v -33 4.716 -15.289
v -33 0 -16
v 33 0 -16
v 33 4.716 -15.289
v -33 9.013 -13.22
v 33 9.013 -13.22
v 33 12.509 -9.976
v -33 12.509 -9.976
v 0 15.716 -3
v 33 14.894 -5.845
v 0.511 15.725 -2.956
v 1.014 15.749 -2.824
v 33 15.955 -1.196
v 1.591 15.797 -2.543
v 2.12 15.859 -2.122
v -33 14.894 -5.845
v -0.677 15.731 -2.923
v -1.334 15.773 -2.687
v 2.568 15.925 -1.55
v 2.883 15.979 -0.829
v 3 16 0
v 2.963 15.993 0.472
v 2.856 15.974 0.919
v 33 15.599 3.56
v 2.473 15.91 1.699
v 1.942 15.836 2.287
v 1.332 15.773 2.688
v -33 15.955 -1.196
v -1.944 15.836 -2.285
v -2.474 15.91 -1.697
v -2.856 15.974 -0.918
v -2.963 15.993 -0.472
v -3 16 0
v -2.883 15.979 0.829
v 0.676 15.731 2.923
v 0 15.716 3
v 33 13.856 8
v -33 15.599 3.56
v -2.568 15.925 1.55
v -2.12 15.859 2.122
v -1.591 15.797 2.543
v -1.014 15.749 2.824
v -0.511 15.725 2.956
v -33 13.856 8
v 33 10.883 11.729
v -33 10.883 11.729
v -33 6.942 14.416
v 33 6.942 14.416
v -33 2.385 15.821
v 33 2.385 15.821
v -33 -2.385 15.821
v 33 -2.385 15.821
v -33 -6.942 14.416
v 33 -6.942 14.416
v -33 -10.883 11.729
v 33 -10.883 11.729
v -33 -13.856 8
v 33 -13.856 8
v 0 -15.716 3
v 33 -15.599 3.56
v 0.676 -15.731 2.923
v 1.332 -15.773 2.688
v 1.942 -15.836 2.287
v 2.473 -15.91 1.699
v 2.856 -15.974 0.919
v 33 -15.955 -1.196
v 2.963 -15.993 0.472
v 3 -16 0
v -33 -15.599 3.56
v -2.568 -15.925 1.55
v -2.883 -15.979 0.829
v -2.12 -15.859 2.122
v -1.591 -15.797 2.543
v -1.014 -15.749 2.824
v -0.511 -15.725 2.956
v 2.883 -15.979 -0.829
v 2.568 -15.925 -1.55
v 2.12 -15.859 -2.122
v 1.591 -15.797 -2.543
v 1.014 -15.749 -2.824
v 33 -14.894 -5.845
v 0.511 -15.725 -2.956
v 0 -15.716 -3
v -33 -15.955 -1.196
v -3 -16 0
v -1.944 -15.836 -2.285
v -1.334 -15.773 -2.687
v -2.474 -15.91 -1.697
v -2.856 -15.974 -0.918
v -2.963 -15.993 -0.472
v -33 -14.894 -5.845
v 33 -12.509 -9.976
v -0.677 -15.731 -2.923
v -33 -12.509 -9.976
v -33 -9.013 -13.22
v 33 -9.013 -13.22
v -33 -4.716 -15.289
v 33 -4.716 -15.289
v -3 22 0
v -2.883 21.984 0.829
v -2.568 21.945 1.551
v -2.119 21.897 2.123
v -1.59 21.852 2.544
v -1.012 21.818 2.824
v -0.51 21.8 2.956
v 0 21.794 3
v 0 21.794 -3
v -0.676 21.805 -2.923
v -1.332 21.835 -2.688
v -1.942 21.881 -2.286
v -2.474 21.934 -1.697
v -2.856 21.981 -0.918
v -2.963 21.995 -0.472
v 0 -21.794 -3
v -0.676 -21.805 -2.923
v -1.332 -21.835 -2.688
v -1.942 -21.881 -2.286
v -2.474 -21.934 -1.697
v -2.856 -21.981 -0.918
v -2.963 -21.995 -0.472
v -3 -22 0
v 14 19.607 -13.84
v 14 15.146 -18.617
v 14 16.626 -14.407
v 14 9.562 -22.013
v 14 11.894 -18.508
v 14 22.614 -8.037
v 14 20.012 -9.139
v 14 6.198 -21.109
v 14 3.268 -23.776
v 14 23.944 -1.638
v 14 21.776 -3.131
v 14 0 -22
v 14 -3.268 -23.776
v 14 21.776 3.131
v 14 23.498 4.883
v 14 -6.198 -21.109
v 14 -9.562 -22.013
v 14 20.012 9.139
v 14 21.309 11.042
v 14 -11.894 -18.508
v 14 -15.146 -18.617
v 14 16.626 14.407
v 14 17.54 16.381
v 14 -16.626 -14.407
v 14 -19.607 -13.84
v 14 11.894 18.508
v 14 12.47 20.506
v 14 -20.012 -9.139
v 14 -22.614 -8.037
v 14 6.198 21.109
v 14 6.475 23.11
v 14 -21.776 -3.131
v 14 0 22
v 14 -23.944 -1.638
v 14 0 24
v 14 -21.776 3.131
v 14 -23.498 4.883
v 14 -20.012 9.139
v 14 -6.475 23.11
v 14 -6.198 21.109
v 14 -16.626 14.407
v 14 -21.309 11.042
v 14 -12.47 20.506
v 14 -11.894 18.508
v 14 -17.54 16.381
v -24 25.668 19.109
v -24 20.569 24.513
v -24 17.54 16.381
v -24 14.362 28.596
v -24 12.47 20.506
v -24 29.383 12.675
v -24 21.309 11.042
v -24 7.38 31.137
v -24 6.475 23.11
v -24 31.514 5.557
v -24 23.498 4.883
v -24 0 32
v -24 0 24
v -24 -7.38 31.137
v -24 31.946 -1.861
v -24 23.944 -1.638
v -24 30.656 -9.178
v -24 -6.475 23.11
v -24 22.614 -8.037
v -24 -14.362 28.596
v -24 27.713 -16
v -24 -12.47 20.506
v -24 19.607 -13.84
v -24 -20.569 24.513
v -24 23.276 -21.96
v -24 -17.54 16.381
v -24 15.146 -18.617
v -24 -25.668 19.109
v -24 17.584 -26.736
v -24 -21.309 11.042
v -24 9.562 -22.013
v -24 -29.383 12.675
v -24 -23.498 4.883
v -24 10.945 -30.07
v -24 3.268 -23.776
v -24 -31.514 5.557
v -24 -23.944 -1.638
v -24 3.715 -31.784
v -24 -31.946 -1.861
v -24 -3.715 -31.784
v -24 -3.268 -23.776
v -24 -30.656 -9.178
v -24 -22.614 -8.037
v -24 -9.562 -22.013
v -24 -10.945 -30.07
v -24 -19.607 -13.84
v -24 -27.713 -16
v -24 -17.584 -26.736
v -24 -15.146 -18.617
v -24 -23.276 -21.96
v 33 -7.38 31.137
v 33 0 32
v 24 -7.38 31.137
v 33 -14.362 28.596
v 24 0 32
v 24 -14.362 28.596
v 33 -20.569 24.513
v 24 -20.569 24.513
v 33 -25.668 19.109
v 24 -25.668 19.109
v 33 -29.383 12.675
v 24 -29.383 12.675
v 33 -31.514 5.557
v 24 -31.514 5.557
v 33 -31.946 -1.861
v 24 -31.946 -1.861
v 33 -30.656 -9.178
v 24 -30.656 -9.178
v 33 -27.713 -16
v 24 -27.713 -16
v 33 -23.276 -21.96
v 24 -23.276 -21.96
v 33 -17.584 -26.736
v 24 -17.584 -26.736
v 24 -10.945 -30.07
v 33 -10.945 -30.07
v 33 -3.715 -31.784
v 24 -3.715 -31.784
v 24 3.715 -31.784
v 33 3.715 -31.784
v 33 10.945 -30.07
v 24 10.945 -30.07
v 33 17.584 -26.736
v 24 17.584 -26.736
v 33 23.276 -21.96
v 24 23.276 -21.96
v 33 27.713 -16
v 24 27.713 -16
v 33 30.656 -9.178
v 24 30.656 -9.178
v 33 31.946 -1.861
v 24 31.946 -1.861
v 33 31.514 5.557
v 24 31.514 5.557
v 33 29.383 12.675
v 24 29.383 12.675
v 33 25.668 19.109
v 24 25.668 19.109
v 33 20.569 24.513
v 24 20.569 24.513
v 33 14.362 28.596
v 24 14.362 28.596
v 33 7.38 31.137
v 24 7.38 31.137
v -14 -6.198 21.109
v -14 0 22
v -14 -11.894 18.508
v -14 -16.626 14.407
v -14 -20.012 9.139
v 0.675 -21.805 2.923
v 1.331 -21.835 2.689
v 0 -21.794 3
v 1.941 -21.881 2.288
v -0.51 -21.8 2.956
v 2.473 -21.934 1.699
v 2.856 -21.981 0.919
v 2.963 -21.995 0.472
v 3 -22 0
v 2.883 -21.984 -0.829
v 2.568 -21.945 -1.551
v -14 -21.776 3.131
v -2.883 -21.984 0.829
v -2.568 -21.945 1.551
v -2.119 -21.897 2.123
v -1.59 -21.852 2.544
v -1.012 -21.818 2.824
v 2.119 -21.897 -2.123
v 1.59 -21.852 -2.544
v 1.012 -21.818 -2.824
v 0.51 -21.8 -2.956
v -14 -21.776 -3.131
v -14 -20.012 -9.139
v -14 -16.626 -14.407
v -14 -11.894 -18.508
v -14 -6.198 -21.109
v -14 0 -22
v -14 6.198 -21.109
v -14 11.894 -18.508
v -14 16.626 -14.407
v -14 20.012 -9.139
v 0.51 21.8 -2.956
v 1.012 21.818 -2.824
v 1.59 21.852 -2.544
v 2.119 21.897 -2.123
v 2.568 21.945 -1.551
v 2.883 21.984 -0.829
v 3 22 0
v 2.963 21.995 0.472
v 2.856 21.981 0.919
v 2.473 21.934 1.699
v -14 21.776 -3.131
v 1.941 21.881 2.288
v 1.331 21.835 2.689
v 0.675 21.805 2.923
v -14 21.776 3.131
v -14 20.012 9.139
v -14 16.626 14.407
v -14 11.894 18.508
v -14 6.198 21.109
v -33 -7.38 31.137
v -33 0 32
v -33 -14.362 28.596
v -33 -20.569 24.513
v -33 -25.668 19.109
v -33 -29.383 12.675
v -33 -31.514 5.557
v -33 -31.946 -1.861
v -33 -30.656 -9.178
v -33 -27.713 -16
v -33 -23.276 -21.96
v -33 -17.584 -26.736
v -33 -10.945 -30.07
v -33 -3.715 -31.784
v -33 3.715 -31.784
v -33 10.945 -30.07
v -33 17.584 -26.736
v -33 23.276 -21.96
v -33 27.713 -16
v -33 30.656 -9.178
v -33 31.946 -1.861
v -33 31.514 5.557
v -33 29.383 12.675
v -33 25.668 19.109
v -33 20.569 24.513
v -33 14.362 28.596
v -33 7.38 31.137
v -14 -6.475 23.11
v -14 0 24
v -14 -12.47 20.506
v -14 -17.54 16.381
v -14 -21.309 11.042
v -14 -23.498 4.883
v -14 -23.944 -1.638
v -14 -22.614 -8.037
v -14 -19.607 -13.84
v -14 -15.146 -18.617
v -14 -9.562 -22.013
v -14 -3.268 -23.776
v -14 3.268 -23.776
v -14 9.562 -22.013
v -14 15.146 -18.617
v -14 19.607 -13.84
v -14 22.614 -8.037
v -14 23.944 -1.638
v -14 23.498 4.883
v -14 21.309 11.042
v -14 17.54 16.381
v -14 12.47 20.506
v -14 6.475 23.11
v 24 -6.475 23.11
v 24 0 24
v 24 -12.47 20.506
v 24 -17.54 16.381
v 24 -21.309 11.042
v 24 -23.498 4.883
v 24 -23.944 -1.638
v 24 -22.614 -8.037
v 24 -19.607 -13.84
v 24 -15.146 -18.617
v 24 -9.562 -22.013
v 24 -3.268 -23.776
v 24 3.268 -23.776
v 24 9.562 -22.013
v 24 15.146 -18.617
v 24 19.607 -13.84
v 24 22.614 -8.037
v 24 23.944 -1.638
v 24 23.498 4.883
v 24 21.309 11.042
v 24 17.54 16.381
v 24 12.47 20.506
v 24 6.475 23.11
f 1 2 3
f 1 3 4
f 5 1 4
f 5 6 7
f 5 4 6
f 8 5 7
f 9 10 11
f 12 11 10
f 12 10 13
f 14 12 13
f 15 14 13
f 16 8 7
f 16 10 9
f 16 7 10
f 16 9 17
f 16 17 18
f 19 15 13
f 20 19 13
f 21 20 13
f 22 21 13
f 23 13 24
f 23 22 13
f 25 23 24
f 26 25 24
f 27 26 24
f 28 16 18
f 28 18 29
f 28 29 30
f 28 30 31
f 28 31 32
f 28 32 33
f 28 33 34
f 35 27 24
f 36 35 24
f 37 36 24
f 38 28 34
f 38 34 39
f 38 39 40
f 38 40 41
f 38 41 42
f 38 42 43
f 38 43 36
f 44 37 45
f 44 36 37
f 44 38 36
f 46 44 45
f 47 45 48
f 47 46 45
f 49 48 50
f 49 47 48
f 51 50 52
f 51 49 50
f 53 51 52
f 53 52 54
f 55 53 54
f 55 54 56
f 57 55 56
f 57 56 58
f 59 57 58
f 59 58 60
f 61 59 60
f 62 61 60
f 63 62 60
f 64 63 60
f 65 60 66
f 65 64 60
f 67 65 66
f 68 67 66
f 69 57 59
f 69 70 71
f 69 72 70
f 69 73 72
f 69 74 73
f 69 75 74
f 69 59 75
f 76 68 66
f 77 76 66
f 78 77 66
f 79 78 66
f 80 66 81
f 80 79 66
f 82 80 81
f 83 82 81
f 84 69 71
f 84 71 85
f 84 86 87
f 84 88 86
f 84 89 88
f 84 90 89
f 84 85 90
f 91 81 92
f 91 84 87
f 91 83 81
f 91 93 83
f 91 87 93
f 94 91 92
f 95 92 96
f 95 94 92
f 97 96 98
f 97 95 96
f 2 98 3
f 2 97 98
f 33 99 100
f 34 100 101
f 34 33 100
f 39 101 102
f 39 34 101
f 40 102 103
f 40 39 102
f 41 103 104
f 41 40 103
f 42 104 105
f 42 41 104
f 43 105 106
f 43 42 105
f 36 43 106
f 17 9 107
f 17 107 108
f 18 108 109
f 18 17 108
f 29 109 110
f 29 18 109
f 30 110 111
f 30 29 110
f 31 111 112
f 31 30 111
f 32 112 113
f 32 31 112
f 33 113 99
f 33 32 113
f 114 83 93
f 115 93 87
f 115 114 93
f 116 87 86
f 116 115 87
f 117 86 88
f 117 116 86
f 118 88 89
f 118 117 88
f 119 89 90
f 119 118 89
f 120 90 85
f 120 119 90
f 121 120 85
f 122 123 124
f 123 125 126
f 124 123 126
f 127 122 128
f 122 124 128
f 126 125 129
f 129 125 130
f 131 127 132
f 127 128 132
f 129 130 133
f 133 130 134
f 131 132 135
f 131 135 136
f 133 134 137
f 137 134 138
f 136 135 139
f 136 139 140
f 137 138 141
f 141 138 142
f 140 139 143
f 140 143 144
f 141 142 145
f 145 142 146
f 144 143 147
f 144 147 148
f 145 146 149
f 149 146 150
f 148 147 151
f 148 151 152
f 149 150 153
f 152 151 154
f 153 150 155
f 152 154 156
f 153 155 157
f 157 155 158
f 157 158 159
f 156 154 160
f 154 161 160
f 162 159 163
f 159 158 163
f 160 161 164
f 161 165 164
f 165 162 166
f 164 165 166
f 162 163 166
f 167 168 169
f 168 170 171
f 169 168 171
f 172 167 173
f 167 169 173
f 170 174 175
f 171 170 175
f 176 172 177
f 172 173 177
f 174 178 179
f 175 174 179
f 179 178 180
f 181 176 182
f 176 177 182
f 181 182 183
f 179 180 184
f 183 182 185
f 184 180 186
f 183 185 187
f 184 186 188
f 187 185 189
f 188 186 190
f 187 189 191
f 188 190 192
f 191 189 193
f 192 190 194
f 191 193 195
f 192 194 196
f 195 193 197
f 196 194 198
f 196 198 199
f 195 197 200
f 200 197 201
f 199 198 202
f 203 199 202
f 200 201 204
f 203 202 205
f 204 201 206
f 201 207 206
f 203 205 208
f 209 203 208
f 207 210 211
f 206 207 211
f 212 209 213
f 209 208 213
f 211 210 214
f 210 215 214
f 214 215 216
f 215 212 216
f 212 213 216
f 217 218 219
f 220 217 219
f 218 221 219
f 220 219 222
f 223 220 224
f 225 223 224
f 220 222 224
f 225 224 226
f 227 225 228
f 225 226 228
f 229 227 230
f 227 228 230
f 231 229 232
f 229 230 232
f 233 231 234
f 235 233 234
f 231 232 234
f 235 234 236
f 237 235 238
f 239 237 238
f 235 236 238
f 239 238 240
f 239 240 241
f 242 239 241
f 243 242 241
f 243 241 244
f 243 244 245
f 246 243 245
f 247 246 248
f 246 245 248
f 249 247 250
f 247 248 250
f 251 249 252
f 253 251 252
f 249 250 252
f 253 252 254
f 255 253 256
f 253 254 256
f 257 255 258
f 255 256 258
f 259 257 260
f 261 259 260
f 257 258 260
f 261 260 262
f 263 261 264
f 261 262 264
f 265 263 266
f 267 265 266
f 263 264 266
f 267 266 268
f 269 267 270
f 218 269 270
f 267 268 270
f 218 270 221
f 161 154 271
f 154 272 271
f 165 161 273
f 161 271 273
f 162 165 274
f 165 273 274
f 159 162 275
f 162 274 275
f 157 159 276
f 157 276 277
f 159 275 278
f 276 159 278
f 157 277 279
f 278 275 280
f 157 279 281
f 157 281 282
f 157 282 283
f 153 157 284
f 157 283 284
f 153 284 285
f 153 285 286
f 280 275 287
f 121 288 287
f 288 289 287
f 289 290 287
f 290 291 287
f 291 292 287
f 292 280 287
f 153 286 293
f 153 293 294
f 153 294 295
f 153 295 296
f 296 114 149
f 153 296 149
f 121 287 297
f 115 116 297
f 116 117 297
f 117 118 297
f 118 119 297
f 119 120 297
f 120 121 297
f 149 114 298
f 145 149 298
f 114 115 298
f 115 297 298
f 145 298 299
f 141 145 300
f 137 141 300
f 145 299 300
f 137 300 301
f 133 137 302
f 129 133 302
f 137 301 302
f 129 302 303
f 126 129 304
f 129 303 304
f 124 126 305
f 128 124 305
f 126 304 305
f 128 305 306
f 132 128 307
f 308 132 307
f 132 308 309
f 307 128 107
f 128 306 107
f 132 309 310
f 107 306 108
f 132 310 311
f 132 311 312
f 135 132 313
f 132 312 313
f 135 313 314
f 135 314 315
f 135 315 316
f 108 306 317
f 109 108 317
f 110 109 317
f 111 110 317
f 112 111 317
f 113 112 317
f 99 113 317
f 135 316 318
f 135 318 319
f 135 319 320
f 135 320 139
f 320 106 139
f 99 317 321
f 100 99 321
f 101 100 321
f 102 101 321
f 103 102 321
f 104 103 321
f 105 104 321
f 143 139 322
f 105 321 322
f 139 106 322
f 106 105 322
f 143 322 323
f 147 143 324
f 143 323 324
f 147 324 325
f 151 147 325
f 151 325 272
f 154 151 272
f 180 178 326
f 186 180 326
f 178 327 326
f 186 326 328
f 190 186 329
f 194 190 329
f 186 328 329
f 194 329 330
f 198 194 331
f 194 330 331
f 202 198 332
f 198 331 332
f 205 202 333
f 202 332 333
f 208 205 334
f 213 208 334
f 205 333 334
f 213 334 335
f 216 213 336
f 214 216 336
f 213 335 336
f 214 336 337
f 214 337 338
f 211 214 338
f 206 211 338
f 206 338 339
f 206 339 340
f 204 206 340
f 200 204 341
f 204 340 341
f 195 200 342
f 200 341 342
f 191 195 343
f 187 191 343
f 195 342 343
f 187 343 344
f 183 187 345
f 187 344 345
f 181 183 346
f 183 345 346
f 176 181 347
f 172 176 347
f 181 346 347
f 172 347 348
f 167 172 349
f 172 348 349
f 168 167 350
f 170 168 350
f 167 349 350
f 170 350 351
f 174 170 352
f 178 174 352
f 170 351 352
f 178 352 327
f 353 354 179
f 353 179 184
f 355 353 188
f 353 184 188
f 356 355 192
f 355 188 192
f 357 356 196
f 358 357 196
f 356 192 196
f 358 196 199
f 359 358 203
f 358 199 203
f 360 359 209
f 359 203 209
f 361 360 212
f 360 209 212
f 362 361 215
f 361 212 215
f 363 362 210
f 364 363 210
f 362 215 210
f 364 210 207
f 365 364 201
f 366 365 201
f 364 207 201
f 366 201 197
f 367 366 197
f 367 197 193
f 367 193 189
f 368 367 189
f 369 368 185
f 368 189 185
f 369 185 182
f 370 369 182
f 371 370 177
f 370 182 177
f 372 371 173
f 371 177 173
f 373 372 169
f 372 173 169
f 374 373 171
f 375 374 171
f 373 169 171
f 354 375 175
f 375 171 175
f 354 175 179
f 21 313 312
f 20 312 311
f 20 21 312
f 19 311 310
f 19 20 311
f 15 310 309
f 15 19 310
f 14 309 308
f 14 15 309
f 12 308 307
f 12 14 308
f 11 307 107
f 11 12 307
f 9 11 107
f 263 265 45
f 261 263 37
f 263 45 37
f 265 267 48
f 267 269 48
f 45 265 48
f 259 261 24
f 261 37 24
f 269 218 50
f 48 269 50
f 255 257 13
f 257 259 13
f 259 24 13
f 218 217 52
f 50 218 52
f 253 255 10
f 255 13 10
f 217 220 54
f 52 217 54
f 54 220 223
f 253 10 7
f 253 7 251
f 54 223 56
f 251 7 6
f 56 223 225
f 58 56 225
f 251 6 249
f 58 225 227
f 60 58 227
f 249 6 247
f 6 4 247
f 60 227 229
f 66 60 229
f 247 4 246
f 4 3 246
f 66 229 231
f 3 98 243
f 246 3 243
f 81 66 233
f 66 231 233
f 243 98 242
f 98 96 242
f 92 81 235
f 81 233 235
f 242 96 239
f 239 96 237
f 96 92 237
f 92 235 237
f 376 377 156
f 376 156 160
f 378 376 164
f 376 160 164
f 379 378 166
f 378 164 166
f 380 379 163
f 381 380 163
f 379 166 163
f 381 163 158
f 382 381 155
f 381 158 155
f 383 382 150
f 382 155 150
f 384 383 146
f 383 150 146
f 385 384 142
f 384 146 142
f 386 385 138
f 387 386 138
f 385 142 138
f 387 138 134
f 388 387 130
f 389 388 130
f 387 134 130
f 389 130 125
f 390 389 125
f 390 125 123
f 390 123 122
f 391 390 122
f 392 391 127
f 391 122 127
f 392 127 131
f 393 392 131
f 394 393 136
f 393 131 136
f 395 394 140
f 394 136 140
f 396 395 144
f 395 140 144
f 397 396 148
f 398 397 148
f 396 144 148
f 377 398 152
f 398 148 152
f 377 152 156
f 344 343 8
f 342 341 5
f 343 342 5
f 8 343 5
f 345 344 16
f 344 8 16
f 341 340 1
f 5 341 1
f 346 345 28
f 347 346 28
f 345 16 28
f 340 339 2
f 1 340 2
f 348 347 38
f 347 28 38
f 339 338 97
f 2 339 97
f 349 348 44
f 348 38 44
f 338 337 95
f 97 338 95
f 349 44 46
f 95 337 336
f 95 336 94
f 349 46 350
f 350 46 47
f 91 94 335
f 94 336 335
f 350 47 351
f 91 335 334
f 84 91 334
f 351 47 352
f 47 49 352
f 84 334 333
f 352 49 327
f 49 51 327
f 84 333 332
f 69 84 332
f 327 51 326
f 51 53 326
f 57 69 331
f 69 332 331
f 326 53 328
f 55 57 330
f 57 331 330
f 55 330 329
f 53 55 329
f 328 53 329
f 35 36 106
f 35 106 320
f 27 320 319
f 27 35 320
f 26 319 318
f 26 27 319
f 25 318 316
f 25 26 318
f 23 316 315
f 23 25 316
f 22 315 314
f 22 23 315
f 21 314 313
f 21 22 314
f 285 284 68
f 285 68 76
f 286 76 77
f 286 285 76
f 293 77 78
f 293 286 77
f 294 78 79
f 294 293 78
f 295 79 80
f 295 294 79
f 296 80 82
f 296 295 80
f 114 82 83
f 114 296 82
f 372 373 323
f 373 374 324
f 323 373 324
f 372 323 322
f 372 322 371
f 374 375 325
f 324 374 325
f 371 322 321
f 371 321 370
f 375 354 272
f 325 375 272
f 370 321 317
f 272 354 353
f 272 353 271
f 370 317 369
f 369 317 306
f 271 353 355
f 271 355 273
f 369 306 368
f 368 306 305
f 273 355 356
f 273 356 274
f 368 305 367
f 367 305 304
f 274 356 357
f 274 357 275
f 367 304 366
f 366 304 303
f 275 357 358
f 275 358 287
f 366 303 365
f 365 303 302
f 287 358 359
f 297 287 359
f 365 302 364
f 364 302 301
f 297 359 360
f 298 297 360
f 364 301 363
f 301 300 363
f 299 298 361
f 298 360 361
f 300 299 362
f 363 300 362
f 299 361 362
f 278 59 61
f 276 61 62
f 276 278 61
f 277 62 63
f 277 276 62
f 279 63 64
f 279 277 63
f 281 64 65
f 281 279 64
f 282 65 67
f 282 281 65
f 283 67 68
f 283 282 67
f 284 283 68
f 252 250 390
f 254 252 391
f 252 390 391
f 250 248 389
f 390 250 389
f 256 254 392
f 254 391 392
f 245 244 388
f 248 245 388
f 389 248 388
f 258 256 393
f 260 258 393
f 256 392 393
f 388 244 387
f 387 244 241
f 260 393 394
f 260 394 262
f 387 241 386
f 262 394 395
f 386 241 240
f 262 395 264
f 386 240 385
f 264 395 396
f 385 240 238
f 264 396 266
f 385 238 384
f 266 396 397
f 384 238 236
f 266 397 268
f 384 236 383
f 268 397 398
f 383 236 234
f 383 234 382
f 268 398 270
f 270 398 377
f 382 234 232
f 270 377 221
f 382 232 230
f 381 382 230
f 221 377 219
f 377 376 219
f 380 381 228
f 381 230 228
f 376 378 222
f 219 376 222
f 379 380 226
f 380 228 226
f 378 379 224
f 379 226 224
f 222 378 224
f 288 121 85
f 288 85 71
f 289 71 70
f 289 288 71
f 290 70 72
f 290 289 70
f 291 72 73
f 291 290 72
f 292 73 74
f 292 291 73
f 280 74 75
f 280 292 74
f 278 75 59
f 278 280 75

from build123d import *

# Parameters (mm, degrees)
CUT_EXTRUDE1_DEPTH      = 57.00892786
CUT_EXTRUDE1_DEPTH_BACK = 57.00892786
SKETCH1_4_R             = 3
CUT_EXTRUDE2_DEPTH      = 81.024996095
CUT_EXTRUDE2_DEPTH_BACK = 81.024996095
SKETCH2_R               = 16


with BuildPart() as part:
    # Sketch1 → Revolve8 (revolve)
    with BuildSketch(Plane(origin=(0, 0, 0), x_dir=(1, 0, 0), z_dir=(0, 1, 0))):
        Polygon((33, 0), (33, 32), (24, 32), (24, 24), (14, 24), (14, 22), (-14, 22), (-14, 24), (-24, 24), (-24, 32), (-33, 32), (-33, 0), align=None)
    revolve(axis=Axis((-33, 0, 0), (1, 0, 0)))

    # Sketch1<4> → Cut-Extrude1 (cut, two sides: drawn at the far end of the back side and taken through both)
    with BuildSketch(Plane(origin=(0, 0, 0), x_dir=(1, 0, 0), z_dir=(0, 1, 0)).offset(-CUT_EXTRUDE1_DEPTH_BACK)):
        Circle(SKETCH1_4_R)
    extrude(amount=CUT_EXTRUDE1_DEPTH + CUT_EXTRUDE1_DEPTH_BACK, mode=Mode.SUBTRACT)

    # Sketch2 → Cut-Extrude2 (cut, two sides: drawn at the far end of the back side and taken through both)
    with BuildSketch(Plane(origin=(33, 0, 0), x_dir=(0, 0, -1), z_dir=(1, 0, 0)).offset(-CUT_EXTRUDE2_DEPTH_BACK)):
        Circle(SKETCH2_R)
    extrude(amount=CUT_EXTRUDE2_DEPTH + CUT_EXTRUDE2_DEPTH_BACK, mode=Mode.SUBTRACT)


solid = part.part
